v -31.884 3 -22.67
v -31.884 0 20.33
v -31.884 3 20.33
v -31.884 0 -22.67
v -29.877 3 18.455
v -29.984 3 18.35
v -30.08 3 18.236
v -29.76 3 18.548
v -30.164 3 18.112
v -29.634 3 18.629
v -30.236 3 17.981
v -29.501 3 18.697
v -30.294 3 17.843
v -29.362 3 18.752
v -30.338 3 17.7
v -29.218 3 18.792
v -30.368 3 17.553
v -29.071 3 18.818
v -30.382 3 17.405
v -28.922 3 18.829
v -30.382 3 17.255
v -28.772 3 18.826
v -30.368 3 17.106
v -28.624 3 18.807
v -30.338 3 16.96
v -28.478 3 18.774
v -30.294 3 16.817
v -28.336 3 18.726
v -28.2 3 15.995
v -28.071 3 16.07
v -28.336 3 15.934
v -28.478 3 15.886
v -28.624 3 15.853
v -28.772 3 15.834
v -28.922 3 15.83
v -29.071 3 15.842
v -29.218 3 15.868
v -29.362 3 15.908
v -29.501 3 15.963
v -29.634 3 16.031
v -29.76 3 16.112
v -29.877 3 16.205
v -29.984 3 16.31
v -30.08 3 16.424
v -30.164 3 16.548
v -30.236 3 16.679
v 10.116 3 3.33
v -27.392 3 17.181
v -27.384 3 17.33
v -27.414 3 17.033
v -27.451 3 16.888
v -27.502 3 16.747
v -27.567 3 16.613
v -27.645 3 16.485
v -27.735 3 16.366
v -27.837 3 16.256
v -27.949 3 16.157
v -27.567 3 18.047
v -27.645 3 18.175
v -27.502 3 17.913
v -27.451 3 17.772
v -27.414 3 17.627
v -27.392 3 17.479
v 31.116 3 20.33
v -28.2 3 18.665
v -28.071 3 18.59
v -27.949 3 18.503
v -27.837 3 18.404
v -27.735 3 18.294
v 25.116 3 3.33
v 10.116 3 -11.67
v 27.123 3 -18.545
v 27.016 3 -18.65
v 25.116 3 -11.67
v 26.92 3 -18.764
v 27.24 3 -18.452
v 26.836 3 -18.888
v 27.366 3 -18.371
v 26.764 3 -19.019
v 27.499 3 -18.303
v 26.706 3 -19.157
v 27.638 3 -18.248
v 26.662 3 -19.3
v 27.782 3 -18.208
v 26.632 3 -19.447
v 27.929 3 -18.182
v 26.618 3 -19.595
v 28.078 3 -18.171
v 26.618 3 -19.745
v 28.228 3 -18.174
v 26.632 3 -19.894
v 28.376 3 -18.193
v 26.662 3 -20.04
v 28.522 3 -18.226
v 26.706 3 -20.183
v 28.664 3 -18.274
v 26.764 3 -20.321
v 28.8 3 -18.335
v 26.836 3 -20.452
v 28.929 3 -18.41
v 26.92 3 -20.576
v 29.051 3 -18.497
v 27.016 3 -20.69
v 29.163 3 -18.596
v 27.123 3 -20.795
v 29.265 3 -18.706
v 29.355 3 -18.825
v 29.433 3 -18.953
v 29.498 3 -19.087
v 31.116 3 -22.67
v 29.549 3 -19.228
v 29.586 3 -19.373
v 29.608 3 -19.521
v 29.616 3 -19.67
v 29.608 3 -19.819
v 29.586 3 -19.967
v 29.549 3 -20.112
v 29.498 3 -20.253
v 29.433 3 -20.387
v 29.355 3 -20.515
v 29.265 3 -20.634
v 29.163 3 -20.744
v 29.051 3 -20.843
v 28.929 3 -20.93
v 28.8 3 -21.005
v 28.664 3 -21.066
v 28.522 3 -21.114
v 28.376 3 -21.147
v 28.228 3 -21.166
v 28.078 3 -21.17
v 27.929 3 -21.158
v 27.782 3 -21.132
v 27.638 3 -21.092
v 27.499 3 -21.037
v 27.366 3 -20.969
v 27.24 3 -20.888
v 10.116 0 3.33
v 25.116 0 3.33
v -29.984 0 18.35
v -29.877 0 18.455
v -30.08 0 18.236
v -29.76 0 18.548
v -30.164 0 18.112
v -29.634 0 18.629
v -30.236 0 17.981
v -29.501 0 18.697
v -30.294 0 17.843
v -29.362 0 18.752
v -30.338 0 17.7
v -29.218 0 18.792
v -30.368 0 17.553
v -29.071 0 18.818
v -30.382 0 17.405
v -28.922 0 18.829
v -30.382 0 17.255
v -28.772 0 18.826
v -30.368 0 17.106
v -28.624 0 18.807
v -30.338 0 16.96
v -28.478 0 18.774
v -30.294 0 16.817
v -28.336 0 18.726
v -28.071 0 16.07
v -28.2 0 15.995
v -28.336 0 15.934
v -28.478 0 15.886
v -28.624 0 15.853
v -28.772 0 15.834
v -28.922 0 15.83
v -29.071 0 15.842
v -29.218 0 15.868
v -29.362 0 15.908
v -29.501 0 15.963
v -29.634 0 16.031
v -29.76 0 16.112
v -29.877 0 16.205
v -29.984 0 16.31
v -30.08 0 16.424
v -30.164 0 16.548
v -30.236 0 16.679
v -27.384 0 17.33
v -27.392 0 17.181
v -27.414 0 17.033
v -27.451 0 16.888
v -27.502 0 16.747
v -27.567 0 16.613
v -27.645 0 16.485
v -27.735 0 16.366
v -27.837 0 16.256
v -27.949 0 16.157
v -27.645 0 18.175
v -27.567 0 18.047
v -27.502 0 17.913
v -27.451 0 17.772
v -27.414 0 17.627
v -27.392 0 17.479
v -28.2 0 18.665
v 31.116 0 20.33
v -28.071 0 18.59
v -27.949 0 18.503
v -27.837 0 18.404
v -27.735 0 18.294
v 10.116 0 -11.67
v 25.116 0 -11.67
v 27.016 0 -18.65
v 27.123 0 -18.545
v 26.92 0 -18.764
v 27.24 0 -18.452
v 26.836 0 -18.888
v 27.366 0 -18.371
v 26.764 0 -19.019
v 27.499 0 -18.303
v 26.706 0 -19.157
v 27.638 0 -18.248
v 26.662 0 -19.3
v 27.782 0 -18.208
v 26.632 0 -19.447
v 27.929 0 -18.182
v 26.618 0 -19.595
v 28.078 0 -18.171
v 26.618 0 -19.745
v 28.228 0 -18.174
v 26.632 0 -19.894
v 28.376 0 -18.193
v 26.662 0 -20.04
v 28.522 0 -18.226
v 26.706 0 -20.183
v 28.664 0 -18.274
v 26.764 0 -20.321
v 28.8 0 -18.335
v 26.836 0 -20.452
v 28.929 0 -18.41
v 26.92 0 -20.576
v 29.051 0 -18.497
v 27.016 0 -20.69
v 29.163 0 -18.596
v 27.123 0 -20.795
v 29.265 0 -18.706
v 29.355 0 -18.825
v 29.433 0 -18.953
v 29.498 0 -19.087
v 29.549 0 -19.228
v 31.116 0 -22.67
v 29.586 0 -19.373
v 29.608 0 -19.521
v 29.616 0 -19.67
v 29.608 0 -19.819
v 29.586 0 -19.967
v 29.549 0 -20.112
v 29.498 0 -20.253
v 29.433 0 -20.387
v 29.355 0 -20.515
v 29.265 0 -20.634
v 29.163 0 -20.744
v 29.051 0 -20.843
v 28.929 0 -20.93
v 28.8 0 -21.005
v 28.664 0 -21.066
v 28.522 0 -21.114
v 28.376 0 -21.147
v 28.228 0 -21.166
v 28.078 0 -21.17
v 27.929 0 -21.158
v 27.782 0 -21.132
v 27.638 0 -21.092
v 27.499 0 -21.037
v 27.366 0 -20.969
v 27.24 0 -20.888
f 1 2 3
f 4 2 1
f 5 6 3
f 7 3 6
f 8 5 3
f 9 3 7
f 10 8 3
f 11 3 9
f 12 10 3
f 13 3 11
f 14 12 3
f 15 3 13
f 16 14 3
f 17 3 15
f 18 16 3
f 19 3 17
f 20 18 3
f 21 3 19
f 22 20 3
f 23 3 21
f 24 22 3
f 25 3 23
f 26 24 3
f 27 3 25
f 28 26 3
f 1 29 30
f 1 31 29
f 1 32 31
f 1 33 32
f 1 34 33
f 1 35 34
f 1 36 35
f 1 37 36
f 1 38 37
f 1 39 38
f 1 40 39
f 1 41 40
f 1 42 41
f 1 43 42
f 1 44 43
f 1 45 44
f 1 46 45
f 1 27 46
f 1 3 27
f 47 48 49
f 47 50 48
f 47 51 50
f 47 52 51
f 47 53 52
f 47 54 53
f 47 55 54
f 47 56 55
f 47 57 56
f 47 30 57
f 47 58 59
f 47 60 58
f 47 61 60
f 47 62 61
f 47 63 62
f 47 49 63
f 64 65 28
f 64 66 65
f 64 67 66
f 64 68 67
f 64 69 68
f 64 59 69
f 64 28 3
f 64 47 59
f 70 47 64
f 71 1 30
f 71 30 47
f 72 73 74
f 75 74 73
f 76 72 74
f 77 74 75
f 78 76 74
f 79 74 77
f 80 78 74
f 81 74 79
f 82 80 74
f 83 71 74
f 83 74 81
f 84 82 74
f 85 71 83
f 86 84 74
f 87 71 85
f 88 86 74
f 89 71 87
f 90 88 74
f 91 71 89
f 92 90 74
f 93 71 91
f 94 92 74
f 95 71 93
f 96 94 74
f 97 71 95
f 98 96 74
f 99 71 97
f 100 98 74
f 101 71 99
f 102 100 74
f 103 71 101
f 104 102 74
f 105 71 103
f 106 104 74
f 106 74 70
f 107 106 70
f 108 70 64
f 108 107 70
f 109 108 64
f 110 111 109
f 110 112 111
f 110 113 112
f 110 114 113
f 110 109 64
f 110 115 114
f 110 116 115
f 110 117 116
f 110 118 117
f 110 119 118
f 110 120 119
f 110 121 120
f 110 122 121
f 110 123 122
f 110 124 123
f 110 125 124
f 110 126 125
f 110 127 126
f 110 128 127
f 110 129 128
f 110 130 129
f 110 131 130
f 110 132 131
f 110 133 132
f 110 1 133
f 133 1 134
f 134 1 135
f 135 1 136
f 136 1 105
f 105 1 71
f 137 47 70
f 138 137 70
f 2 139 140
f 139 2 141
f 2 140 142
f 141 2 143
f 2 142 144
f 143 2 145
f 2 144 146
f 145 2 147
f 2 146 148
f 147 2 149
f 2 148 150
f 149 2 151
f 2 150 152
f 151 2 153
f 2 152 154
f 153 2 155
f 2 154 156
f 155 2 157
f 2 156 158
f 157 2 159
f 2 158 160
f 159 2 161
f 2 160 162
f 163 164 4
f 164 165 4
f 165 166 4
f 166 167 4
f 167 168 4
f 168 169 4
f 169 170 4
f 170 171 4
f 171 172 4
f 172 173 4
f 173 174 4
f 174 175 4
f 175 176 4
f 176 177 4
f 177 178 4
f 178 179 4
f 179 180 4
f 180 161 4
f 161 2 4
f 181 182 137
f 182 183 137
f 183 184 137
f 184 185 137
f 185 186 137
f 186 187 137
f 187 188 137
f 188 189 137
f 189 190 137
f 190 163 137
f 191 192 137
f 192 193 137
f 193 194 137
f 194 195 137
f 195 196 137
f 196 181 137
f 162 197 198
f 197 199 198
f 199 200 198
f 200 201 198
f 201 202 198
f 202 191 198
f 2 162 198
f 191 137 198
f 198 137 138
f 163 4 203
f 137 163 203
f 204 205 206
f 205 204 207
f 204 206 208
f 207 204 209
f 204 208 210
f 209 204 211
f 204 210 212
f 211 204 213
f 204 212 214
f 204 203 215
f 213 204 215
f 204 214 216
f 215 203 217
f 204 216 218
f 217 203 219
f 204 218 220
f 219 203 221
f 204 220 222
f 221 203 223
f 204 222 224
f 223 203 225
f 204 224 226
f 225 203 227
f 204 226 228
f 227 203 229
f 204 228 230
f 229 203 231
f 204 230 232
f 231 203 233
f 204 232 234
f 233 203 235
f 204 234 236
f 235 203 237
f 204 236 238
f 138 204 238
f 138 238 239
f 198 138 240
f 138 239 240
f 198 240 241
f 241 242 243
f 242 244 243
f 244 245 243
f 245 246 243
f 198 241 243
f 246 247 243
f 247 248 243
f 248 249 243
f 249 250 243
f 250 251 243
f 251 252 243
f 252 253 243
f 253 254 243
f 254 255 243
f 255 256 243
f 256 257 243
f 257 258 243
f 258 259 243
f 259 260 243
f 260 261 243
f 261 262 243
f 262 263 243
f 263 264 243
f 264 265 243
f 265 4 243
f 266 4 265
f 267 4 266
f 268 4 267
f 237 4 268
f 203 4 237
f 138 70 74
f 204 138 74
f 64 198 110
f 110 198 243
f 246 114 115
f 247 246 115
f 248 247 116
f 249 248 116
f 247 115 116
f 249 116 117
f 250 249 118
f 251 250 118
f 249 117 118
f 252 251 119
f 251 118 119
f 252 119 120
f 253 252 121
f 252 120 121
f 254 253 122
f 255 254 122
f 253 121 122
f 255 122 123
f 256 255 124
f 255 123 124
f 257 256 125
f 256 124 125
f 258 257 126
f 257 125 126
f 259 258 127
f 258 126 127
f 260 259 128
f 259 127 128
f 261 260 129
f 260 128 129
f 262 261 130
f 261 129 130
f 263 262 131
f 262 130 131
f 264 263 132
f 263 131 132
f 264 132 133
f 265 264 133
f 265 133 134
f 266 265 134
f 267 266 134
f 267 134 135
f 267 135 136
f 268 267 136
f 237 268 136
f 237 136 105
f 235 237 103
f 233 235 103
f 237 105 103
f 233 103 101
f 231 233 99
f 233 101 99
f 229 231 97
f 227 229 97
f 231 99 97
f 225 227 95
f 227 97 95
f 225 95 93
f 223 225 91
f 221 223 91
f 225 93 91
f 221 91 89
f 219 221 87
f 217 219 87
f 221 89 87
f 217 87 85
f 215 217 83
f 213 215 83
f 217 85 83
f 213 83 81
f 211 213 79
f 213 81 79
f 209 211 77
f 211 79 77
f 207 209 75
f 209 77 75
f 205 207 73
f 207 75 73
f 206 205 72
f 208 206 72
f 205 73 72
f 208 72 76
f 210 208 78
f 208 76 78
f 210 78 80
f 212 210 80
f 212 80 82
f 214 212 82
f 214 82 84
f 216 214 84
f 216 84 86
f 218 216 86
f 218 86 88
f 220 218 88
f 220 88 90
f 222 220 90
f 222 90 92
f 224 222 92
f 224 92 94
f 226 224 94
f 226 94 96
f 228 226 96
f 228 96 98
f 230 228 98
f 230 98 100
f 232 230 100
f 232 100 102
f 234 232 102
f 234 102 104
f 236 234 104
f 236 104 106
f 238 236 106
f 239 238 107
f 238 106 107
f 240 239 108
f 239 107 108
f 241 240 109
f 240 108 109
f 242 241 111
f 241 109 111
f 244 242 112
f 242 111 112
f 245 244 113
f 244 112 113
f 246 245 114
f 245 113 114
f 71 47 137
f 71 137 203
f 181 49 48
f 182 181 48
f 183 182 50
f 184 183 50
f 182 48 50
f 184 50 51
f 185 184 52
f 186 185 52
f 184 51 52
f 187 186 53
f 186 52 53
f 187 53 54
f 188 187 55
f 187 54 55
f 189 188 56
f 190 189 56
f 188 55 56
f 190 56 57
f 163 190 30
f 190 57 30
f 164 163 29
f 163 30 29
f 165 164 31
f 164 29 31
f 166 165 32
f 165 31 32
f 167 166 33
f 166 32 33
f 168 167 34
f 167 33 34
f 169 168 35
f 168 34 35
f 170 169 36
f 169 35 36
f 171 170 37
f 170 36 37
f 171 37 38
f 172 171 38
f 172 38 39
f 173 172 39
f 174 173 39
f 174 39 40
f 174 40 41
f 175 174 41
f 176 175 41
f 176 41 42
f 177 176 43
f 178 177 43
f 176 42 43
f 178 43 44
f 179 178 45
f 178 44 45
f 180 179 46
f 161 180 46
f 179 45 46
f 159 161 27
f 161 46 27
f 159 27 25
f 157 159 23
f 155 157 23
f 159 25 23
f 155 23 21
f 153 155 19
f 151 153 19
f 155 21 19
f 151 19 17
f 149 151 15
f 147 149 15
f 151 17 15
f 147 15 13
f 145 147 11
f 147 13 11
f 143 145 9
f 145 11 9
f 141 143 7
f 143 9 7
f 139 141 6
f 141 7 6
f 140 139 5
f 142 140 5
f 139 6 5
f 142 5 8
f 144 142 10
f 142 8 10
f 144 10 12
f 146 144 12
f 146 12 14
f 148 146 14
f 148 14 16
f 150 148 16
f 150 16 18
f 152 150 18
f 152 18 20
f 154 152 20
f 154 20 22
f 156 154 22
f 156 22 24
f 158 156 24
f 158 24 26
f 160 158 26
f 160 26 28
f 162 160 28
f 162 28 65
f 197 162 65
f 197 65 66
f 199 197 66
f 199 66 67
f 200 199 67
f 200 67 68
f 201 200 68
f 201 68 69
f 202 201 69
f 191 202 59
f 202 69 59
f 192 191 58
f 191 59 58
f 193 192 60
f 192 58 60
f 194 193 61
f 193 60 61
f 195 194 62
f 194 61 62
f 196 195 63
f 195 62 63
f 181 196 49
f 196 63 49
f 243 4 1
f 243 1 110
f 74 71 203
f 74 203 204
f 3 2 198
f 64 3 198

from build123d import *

# Parameters (mm, degrees)
SKETCH2_W           = 63
SKETCH2_H           = 43
BOSS_EXTRUDE1_DEPTH = 3
SKETCH3_R           = 1.5
CUT_EXTRUDE1_DEPTH  = 3
SKETCH4_R           = 1.5
CUT_EXTRUDE2_DEPTH  = 3
SKETCH5_W           = 15
SKETCH5_H           = 15
CUT_EXTRUDE3_DEPTH  = 3


with BuildPart() as part:
    # Sketch2 → Boss-Extrude1 (new body)
    with BuildSketch(Plane(origin=(0, 0, 0), x_dir=(1, 0, 0), z_dir=(0, 1, 0))):
        with Locations((-0.384353741, 1.170068027)):
            Rectangle(SKETCH2_W, SKETCH2_H)
    extrude(amount=BOSS_EXTRUDE1_DEPTH)

    # Sketch3 → Cut-Extrude1 (cut)
    with BuildSketch(Plane(origin=(0, 3, 0), x_dir=(1, 0, 0), z_dir=(0, 1, 0))):
        with Locations((28.115646259, 19.670068027)):
            Circle(SKETCH3_R)
    extrude(amount=-CUT_EXTRUDE1_DEPTH, mode=Mode.SUBTRACT)

    # Sketch4 → Cut-Extrude2 (cut)
    with BuildSketch(Plane(origin=(0, 3, 0), x_dir=(1, 0, 0), z_dir=(0, 1, 0))):
        with Locations((-28.884353741, -17.329931973)):
            Circle(SKETCH4_R)
    extrude(amount=-CUT_EXTRUDE2_DEPTH, mode=Mode.SUBTRACT)

    # Sketch5 → Cut-Extrude3 (cut)
    with BuildSketch(Plane(origin=(0, 3, 0), x_dir=(1, 0, 0), z_dir=(0, 1, 0))):
        with Locations((17.615646259, 4.170068027)):
            Rectangle(SKETCH5_W, SKETCH5_H)
    extrude(amount=-CUT_EXTRUDE3_DEPTH, mode=Mode.SUBTRACT)


solid = part.part
